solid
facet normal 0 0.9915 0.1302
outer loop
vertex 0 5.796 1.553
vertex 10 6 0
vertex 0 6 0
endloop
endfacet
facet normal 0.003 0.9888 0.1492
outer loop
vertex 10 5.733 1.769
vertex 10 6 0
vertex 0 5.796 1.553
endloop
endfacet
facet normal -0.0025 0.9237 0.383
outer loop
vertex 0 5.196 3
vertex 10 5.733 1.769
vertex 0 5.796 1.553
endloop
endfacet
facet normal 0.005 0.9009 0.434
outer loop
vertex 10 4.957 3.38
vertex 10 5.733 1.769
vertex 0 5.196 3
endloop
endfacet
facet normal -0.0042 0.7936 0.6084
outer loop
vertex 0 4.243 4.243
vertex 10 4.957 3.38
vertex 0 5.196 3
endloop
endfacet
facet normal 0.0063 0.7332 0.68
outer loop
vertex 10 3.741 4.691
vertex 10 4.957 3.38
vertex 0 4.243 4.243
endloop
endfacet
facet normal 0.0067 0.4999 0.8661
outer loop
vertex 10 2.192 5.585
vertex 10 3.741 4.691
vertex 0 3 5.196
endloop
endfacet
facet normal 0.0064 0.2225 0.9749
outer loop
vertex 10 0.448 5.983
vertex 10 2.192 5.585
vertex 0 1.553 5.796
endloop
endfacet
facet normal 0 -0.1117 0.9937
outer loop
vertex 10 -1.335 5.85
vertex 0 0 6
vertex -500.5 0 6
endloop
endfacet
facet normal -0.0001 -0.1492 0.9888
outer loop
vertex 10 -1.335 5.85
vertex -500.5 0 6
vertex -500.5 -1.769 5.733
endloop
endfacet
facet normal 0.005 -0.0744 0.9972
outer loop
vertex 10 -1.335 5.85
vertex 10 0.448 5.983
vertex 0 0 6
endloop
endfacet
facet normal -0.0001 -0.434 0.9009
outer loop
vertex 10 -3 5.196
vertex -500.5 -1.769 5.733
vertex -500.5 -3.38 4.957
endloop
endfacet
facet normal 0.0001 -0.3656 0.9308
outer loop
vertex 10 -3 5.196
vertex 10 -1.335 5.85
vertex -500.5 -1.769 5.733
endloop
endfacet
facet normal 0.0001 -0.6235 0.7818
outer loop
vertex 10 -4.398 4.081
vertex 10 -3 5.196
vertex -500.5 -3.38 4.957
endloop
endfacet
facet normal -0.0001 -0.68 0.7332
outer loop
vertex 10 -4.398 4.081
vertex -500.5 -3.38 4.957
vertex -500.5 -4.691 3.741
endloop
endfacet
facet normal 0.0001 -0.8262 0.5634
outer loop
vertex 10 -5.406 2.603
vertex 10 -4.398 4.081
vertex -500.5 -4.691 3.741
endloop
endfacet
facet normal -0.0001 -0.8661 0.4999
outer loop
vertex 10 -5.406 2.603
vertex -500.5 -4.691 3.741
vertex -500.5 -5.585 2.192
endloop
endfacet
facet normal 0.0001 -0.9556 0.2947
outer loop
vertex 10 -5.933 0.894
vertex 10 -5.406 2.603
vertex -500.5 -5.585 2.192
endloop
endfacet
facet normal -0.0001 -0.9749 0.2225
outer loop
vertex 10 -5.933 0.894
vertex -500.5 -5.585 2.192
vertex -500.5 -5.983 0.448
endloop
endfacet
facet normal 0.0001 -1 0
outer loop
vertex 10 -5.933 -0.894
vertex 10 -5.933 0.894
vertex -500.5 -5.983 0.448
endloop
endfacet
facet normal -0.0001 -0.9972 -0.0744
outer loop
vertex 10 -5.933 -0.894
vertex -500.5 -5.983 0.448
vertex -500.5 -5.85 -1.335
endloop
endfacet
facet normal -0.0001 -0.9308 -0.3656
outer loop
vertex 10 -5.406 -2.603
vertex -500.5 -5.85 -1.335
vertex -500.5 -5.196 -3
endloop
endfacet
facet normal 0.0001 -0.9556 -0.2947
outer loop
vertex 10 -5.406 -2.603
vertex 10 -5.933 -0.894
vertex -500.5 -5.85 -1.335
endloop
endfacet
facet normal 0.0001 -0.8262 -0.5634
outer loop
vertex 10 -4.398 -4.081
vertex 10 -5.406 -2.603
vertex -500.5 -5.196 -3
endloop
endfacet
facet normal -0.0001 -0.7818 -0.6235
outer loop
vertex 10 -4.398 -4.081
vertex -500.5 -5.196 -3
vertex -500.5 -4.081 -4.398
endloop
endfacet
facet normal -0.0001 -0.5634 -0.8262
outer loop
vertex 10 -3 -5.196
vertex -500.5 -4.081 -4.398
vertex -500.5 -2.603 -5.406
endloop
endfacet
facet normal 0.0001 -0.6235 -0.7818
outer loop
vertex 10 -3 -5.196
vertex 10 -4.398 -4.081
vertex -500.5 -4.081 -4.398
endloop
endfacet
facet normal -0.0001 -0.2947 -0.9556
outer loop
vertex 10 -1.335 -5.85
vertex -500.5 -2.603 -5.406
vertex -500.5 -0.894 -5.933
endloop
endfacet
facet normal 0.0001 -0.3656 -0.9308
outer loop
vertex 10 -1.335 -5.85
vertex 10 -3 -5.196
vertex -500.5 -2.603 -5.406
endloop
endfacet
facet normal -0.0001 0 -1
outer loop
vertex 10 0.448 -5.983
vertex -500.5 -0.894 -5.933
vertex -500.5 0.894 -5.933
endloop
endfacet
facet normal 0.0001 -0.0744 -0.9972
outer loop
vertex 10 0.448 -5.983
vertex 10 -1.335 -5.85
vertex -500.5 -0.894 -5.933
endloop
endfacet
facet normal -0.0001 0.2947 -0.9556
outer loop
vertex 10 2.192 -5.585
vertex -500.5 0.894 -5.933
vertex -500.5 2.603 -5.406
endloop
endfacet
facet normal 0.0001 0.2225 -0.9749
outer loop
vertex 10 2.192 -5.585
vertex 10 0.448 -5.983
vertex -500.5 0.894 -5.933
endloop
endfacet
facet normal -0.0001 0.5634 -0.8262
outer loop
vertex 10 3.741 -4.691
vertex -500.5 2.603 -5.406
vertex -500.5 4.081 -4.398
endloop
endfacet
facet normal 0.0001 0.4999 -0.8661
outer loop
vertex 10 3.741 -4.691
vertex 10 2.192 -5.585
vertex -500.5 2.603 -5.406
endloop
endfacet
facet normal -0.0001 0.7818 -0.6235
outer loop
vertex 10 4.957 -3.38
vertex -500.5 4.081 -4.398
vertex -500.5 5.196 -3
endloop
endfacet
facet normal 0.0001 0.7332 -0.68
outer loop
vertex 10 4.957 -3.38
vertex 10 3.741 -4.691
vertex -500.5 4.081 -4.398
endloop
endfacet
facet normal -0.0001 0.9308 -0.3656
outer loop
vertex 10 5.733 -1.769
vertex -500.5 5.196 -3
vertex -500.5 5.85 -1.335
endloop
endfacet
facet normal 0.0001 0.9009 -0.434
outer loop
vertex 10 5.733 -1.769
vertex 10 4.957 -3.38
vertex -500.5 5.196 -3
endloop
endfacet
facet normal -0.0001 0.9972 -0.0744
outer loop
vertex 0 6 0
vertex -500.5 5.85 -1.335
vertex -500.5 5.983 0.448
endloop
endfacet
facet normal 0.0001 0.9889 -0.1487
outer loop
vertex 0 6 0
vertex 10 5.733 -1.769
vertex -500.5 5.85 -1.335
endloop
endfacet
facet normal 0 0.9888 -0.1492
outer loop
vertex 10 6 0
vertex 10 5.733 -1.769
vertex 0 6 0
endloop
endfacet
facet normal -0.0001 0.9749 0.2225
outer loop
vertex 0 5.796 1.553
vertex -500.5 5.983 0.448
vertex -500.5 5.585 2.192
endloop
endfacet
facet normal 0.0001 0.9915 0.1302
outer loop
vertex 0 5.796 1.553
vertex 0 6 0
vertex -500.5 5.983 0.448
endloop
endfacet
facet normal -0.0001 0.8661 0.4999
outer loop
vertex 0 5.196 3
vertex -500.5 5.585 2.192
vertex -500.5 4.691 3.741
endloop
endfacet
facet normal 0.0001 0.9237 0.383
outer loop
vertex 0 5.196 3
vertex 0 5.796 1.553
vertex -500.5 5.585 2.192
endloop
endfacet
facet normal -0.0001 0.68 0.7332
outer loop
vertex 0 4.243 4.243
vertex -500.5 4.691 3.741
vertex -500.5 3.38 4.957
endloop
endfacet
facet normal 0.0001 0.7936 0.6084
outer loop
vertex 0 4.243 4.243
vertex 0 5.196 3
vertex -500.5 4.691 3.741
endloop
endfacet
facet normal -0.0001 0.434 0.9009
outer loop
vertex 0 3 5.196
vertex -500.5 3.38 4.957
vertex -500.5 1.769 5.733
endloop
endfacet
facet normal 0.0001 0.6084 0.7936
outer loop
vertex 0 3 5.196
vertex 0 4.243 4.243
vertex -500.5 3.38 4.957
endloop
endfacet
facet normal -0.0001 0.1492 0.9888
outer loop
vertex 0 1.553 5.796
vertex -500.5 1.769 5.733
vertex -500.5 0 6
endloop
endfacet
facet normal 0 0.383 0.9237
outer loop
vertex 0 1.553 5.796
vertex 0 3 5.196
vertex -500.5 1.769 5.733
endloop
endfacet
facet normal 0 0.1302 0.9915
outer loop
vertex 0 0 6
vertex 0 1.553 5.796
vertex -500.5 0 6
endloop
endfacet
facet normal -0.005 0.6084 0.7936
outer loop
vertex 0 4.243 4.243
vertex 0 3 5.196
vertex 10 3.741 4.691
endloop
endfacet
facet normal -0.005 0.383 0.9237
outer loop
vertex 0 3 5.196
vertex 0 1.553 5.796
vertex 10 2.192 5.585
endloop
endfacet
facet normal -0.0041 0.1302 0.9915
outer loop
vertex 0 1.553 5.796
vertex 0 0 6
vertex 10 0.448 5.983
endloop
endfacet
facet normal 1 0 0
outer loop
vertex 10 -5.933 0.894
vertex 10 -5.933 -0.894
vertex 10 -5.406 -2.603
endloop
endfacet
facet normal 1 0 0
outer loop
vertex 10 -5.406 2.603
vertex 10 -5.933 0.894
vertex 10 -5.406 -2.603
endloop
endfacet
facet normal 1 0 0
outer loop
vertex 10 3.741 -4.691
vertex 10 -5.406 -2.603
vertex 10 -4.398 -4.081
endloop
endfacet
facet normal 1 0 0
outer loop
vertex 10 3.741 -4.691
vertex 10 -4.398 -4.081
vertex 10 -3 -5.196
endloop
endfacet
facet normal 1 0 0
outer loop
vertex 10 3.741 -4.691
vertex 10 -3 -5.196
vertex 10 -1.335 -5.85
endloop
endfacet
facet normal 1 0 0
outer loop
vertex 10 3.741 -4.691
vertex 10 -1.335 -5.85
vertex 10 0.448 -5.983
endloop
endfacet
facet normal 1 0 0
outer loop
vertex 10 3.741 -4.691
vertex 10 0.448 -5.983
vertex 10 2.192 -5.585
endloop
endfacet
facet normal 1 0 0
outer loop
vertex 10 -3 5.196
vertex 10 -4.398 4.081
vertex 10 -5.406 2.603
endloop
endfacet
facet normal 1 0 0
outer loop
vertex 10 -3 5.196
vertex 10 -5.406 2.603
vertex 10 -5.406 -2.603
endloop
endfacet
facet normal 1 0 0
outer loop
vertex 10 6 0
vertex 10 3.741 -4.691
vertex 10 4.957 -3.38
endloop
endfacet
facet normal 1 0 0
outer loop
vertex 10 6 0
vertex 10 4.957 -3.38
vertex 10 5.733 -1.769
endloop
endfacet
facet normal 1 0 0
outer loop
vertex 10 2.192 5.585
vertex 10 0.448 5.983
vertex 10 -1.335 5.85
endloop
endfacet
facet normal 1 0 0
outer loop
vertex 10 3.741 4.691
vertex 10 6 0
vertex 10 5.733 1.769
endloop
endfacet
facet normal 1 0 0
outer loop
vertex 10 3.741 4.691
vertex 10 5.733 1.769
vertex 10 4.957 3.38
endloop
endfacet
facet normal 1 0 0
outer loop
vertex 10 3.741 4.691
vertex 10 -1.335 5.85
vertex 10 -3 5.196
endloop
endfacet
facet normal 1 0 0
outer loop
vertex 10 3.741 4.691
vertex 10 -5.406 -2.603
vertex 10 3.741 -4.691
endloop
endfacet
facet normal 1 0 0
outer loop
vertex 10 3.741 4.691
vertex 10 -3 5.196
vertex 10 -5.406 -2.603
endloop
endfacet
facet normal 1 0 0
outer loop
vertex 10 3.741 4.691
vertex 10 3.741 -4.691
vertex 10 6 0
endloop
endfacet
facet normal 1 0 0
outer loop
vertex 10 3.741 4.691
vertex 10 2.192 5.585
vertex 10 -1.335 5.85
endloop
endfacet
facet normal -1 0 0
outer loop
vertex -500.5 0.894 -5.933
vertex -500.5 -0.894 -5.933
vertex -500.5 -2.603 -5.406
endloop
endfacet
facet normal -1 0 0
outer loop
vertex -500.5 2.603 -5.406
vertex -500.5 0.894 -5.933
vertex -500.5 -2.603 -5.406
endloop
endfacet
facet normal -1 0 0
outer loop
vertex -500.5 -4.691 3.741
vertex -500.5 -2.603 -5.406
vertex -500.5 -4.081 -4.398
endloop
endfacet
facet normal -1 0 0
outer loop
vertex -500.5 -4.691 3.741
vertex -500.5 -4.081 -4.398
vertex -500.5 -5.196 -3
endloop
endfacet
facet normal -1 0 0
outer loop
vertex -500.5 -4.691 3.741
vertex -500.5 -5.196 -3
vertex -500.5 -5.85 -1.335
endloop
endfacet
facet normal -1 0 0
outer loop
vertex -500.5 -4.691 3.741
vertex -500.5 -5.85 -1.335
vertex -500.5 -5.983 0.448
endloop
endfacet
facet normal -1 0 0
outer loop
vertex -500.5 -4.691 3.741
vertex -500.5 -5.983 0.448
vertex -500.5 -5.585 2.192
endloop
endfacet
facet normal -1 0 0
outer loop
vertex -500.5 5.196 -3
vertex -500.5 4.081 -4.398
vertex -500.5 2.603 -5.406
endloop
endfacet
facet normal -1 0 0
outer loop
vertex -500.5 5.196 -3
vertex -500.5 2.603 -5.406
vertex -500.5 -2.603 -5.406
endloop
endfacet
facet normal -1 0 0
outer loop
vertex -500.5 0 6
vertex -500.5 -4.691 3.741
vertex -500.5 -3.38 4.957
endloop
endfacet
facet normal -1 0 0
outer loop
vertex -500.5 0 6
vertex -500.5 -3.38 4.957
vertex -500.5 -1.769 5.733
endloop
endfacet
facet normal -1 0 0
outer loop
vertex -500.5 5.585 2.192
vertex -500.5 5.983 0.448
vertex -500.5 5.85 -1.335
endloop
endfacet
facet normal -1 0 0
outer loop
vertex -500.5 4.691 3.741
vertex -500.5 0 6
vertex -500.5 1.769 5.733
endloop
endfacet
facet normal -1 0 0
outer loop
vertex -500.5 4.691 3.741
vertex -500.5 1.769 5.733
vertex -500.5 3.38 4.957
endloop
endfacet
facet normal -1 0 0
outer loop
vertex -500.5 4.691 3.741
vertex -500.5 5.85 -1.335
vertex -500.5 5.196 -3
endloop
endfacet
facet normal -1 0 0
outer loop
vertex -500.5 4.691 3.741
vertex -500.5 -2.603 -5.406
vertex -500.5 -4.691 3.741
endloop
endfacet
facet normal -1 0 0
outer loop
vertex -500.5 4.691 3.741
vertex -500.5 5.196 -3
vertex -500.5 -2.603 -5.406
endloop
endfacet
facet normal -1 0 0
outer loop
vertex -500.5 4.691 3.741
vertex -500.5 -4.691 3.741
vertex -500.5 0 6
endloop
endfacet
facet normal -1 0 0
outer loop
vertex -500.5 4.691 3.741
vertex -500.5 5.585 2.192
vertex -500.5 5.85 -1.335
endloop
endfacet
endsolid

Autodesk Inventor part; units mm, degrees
sketch "Sketch1" plane through (0, 0, 0) normal (1, 0, 0) x (0, 1, 0)
  circle A0 centre (0, 0) radius 6
  dimension "d0" = 12
extrude "Extrusion1" add sketch "Sketch1" along normal blind 10
sketch "Sketch2" plane through (0, 0, 0) normal (-1, 0, 0) x (0, 0, 1)
  circle A0 centre (0, 0) radius 6 projected
ref_plane "Work Plane1" through (-497, -256, -240) normal (-1, 0, 0) x (0, 0, 1)
ref_plane "Work Plane2" through (-697, -256, -240) normal (-1, 0, 0) x (0, 0, 1)
ref_plane "Work Plane3" through (-497, -256, -240) normal (-1, 0, 0) x (0, 0, 1)
ref_plane "Work Plane5" through (-481.5, -422.4955, -226.2332) normal (1, 0, 0) x (0, 0.3162, 0.9487)
extrude "Extrusion3" add sketch "Sketch2" along normal up to surface (481.5 mm away)
sketch "Sketch3" plane through (-481.5, 0, 0) normal (-1, 0, 0) x (0, 0, 1)
  circle A0 centre (0, 0) radius 6 projected
  point P0 (0, 0)
ref_plane "Work Plane6" through (-500.5, -12.5, -12.5) normal (-1, 0, 0) x (0, 0, 1)
extrude "Extrusion4" add sketch "Sketch3" along normal up to surface (19 mm away)
properties part number "12MM_X_AXIS_SHAFT"
